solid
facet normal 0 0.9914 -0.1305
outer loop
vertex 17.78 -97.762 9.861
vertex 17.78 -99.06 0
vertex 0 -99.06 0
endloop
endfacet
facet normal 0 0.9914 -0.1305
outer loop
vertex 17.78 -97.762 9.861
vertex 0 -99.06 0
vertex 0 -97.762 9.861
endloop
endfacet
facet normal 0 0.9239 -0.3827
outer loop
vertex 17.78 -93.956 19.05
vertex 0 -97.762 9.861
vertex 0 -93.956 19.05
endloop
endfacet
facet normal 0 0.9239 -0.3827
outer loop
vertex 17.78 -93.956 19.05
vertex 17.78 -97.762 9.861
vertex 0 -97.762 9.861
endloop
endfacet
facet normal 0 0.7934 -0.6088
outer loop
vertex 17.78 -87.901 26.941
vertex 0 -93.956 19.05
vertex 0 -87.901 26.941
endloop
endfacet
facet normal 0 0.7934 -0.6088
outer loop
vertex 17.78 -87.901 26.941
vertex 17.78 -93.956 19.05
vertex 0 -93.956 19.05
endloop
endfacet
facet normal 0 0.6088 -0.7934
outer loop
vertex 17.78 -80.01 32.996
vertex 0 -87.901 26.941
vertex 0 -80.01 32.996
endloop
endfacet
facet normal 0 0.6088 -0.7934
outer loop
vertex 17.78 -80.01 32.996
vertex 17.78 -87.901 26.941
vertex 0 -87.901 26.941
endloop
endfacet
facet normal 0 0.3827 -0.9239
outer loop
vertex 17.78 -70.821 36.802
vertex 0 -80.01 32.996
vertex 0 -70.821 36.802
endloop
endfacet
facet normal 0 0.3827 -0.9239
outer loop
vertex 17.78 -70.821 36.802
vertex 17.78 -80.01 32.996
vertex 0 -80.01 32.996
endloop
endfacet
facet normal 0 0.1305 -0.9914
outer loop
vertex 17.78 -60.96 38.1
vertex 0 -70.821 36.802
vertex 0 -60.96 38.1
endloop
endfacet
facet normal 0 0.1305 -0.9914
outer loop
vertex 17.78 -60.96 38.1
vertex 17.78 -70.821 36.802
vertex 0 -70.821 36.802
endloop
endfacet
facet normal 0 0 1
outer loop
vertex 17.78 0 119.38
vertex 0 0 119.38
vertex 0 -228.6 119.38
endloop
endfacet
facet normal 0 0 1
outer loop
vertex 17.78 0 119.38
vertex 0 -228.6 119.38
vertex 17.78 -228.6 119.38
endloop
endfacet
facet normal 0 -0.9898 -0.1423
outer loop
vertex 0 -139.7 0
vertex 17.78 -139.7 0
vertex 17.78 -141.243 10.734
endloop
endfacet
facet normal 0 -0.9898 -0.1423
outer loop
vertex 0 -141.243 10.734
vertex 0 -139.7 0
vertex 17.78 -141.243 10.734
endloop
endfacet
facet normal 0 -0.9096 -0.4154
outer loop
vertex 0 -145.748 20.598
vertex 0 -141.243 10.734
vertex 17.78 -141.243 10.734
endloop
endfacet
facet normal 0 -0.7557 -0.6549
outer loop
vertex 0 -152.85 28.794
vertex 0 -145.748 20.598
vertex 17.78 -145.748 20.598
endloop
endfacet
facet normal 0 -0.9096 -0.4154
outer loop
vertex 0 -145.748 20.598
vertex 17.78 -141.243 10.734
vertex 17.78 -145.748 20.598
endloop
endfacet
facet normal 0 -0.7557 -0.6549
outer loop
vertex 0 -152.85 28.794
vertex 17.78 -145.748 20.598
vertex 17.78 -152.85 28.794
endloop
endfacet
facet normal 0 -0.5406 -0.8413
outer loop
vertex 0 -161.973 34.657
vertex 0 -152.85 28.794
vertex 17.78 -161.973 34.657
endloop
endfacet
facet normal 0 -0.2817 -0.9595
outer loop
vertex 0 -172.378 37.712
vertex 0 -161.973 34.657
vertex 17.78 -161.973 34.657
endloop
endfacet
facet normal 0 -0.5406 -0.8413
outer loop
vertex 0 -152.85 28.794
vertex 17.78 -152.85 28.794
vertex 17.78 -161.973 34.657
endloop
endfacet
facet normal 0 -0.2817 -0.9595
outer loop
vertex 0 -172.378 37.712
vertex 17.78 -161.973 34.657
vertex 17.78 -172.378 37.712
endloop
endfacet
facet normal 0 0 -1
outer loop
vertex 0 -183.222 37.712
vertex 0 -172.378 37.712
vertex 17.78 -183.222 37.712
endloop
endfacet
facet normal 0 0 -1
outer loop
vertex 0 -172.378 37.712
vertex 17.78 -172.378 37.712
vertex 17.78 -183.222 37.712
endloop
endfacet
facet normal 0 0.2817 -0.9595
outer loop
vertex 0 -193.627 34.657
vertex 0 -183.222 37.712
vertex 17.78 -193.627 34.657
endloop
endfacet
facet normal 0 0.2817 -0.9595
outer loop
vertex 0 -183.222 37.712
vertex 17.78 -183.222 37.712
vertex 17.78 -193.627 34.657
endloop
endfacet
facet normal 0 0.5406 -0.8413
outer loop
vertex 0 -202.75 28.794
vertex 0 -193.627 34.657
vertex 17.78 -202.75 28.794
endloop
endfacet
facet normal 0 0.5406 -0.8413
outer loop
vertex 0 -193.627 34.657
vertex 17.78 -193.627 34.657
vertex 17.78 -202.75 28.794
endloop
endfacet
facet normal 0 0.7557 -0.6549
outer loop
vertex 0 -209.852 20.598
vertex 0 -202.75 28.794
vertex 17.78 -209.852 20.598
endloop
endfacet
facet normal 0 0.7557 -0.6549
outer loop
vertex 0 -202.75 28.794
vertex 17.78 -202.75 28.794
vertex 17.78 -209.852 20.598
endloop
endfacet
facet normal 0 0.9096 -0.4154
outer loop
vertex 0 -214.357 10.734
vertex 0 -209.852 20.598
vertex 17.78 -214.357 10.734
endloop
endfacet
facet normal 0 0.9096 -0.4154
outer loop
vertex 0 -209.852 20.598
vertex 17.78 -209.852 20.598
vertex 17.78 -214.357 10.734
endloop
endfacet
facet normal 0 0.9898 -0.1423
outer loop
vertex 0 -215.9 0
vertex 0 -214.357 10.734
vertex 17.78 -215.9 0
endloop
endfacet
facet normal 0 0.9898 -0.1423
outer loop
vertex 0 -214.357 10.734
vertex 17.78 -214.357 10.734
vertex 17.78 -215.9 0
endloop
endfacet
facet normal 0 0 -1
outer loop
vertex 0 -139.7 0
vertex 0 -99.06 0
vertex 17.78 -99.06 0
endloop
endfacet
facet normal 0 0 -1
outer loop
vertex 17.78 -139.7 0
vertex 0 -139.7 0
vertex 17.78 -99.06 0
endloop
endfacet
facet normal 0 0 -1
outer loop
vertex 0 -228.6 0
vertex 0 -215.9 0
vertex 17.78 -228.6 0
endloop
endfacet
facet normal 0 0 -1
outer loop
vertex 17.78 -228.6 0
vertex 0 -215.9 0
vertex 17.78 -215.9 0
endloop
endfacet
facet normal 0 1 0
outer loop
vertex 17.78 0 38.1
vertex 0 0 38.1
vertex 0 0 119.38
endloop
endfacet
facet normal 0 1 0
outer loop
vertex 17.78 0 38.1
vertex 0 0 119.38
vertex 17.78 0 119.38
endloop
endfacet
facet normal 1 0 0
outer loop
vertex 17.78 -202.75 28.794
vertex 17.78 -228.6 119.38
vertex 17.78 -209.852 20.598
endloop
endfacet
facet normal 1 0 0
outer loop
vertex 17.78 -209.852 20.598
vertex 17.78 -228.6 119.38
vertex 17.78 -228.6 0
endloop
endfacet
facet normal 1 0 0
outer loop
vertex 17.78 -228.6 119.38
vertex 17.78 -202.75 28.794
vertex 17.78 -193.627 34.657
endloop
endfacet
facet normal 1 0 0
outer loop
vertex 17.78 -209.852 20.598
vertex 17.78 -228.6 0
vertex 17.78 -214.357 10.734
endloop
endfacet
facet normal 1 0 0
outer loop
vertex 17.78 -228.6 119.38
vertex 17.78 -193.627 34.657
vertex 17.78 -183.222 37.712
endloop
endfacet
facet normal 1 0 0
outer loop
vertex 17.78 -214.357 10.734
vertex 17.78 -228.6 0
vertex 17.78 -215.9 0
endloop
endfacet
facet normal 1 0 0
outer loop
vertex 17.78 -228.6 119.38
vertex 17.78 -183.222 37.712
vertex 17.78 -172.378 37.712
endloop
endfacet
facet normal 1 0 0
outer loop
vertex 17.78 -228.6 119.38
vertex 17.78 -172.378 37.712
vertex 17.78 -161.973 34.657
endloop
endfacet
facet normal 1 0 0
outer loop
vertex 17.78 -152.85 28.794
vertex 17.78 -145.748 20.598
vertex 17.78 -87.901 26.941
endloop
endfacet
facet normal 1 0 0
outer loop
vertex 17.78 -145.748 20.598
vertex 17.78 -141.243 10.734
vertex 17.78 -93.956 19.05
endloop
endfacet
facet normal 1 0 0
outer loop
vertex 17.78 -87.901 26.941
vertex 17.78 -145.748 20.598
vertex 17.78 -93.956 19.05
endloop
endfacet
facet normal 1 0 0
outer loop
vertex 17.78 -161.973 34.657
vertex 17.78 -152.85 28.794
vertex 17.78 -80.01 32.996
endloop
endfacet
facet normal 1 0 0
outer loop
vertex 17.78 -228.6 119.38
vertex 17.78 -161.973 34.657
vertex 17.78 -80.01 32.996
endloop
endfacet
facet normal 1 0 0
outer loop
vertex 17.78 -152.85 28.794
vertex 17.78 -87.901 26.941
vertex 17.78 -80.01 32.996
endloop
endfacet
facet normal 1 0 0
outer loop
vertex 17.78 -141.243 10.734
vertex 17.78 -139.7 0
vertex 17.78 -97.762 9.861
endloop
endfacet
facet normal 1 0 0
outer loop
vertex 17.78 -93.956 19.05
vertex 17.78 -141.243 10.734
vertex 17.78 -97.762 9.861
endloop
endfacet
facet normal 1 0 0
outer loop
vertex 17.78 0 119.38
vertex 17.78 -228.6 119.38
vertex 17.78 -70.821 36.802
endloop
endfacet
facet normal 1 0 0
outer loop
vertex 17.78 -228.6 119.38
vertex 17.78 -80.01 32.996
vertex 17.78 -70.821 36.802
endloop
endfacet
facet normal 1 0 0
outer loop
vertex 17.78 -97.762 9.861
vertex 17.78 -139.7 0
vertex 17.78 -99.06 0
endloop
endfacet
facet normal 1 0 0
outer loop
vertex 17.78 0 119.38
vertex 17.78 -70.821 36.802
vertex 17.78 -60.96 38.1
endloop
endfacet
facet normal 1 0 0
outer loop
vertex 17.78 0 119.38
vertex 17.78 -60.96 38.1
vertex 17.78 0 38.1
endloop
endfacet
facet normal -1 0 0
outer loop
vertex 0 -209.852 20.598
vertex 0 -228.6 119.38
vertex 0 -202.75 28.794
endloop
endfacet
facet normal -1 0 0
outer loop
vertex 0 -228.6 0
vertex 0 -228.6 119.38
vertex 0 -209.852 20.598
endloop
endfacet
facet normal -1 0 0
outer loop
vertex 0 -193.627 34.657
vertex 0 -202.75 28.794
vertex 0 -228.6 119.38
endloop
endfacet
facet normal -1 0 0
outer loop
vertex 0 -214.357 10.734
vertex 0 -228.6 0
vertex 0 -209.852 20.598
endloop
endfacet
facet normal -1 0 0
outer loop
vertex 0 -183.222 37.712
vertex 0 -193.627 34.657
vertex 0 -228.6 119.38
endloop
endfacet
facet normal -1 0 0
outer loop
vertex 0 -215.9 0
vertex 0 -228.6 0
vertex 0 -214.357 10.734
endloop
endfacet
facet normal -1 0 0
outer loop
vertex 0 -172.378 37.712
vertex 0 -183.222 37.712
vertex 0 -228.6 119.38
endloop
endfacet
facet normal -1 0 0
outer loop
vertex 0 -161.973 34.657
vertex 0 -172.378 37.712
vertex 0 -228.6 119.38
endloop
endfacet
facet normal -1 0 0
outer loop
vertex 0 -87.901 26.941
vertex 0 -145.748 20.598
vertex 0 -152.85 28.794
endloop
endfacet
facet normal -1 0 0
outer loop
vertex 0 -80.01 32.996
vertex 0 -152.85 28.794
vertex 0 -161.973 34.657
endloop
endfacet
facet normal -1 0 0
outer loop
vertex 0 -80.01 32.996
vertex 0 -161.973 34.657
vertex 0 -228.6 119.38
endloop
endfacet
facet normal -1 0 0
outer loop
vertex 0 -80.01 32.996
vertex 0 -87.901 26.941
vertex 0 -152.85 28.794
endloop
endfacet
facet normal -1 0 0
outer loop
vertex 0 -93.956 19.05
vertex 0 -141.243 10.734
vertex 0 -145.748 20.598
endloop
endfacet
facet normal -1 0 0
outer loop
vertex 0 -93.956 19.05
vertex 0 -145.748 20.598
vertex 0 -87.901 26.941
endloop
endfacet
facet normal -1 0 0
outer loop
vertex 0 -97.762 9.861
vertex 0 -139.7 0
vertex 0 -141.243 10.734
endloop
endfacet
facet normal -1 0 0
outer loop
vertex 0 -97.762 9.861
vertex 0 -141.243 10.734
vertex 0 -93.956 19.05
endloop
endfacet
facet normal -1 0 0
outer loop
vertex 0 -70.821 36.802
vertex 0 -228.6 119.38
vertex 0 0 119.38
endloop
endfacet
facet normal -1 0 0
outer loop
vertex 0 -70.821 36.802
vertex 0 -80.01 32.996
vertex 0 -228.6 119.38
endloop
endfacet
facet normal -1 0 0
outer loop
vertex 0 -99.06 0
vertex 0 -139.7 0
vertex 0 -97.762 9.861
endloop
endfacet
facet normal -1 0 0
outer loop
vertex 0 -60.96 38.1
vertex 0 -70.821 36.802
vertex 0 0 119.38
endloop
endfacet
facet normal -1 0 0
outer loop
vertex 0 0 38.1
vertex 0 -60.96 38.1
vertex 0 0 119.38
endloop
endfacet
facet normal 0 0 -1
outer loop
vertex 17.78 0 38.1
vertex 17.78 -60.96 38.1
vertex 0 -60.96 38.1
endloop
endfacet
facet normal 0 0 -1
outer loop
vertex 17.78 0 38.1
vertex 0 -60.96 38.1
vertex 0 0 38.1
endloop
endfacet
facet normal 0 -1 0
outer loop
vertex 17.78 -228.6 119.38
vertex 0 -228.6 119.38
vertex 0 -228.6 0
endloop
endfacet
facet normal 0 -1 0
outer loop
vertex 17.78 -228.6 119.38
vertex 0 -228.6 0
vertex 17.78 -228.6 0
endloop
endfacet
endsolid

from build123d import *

# Parameters (mm, degrees)
SKETCH1_W           = 17.78
SKETCH1_H           = 228.6
BOSS_EXTRUDE1_DEPTH = 119.38
CUT_EXTRUDE1_DEPTH  = 259.506620418


with BuildPart() as part:
    # Sketch1 → Boss-Extrude1 (new body)
    with BuildSketch(Plane.XY):
        with Locations((8.89, -114.3)):
            Rectangle(SKETCH1_W, SKETCH1_H)
    extrude(amount=BOSS_EXTRUDE1_DEPTH)

    # Sketch2 → Cut-Extrude1 (cut, through all)
    with BuildSketch(Plane(origin=(17.78, 0, 0), x_dir=(0, 0, -1), z_dir=(1, 0, 0))):
        with BuildLine():
            Line((-38.1, -60.96), (-38.1, 0))
            Line((-38.1, 0), (0, 0))
            Line((0, 0), (0, -22.86))
            Line((0, -22.86), (0, -99.06))
            ThreePointArc((0, -99.06), (-26.940768363, -87.900768363), (-38.1, -60.96))
        make_face()
        with BuildLine():
            Line((0, -215.9), (0, -139.7))
            ThreePointArc((0, -139.7), (-38.1, -177.8), (0, -215.9))
        make_face()
    extrude(amount=-CUT_EXTRUDE1_DEPTH, mode=Mode.SUBTRACT)


solid = part.part
